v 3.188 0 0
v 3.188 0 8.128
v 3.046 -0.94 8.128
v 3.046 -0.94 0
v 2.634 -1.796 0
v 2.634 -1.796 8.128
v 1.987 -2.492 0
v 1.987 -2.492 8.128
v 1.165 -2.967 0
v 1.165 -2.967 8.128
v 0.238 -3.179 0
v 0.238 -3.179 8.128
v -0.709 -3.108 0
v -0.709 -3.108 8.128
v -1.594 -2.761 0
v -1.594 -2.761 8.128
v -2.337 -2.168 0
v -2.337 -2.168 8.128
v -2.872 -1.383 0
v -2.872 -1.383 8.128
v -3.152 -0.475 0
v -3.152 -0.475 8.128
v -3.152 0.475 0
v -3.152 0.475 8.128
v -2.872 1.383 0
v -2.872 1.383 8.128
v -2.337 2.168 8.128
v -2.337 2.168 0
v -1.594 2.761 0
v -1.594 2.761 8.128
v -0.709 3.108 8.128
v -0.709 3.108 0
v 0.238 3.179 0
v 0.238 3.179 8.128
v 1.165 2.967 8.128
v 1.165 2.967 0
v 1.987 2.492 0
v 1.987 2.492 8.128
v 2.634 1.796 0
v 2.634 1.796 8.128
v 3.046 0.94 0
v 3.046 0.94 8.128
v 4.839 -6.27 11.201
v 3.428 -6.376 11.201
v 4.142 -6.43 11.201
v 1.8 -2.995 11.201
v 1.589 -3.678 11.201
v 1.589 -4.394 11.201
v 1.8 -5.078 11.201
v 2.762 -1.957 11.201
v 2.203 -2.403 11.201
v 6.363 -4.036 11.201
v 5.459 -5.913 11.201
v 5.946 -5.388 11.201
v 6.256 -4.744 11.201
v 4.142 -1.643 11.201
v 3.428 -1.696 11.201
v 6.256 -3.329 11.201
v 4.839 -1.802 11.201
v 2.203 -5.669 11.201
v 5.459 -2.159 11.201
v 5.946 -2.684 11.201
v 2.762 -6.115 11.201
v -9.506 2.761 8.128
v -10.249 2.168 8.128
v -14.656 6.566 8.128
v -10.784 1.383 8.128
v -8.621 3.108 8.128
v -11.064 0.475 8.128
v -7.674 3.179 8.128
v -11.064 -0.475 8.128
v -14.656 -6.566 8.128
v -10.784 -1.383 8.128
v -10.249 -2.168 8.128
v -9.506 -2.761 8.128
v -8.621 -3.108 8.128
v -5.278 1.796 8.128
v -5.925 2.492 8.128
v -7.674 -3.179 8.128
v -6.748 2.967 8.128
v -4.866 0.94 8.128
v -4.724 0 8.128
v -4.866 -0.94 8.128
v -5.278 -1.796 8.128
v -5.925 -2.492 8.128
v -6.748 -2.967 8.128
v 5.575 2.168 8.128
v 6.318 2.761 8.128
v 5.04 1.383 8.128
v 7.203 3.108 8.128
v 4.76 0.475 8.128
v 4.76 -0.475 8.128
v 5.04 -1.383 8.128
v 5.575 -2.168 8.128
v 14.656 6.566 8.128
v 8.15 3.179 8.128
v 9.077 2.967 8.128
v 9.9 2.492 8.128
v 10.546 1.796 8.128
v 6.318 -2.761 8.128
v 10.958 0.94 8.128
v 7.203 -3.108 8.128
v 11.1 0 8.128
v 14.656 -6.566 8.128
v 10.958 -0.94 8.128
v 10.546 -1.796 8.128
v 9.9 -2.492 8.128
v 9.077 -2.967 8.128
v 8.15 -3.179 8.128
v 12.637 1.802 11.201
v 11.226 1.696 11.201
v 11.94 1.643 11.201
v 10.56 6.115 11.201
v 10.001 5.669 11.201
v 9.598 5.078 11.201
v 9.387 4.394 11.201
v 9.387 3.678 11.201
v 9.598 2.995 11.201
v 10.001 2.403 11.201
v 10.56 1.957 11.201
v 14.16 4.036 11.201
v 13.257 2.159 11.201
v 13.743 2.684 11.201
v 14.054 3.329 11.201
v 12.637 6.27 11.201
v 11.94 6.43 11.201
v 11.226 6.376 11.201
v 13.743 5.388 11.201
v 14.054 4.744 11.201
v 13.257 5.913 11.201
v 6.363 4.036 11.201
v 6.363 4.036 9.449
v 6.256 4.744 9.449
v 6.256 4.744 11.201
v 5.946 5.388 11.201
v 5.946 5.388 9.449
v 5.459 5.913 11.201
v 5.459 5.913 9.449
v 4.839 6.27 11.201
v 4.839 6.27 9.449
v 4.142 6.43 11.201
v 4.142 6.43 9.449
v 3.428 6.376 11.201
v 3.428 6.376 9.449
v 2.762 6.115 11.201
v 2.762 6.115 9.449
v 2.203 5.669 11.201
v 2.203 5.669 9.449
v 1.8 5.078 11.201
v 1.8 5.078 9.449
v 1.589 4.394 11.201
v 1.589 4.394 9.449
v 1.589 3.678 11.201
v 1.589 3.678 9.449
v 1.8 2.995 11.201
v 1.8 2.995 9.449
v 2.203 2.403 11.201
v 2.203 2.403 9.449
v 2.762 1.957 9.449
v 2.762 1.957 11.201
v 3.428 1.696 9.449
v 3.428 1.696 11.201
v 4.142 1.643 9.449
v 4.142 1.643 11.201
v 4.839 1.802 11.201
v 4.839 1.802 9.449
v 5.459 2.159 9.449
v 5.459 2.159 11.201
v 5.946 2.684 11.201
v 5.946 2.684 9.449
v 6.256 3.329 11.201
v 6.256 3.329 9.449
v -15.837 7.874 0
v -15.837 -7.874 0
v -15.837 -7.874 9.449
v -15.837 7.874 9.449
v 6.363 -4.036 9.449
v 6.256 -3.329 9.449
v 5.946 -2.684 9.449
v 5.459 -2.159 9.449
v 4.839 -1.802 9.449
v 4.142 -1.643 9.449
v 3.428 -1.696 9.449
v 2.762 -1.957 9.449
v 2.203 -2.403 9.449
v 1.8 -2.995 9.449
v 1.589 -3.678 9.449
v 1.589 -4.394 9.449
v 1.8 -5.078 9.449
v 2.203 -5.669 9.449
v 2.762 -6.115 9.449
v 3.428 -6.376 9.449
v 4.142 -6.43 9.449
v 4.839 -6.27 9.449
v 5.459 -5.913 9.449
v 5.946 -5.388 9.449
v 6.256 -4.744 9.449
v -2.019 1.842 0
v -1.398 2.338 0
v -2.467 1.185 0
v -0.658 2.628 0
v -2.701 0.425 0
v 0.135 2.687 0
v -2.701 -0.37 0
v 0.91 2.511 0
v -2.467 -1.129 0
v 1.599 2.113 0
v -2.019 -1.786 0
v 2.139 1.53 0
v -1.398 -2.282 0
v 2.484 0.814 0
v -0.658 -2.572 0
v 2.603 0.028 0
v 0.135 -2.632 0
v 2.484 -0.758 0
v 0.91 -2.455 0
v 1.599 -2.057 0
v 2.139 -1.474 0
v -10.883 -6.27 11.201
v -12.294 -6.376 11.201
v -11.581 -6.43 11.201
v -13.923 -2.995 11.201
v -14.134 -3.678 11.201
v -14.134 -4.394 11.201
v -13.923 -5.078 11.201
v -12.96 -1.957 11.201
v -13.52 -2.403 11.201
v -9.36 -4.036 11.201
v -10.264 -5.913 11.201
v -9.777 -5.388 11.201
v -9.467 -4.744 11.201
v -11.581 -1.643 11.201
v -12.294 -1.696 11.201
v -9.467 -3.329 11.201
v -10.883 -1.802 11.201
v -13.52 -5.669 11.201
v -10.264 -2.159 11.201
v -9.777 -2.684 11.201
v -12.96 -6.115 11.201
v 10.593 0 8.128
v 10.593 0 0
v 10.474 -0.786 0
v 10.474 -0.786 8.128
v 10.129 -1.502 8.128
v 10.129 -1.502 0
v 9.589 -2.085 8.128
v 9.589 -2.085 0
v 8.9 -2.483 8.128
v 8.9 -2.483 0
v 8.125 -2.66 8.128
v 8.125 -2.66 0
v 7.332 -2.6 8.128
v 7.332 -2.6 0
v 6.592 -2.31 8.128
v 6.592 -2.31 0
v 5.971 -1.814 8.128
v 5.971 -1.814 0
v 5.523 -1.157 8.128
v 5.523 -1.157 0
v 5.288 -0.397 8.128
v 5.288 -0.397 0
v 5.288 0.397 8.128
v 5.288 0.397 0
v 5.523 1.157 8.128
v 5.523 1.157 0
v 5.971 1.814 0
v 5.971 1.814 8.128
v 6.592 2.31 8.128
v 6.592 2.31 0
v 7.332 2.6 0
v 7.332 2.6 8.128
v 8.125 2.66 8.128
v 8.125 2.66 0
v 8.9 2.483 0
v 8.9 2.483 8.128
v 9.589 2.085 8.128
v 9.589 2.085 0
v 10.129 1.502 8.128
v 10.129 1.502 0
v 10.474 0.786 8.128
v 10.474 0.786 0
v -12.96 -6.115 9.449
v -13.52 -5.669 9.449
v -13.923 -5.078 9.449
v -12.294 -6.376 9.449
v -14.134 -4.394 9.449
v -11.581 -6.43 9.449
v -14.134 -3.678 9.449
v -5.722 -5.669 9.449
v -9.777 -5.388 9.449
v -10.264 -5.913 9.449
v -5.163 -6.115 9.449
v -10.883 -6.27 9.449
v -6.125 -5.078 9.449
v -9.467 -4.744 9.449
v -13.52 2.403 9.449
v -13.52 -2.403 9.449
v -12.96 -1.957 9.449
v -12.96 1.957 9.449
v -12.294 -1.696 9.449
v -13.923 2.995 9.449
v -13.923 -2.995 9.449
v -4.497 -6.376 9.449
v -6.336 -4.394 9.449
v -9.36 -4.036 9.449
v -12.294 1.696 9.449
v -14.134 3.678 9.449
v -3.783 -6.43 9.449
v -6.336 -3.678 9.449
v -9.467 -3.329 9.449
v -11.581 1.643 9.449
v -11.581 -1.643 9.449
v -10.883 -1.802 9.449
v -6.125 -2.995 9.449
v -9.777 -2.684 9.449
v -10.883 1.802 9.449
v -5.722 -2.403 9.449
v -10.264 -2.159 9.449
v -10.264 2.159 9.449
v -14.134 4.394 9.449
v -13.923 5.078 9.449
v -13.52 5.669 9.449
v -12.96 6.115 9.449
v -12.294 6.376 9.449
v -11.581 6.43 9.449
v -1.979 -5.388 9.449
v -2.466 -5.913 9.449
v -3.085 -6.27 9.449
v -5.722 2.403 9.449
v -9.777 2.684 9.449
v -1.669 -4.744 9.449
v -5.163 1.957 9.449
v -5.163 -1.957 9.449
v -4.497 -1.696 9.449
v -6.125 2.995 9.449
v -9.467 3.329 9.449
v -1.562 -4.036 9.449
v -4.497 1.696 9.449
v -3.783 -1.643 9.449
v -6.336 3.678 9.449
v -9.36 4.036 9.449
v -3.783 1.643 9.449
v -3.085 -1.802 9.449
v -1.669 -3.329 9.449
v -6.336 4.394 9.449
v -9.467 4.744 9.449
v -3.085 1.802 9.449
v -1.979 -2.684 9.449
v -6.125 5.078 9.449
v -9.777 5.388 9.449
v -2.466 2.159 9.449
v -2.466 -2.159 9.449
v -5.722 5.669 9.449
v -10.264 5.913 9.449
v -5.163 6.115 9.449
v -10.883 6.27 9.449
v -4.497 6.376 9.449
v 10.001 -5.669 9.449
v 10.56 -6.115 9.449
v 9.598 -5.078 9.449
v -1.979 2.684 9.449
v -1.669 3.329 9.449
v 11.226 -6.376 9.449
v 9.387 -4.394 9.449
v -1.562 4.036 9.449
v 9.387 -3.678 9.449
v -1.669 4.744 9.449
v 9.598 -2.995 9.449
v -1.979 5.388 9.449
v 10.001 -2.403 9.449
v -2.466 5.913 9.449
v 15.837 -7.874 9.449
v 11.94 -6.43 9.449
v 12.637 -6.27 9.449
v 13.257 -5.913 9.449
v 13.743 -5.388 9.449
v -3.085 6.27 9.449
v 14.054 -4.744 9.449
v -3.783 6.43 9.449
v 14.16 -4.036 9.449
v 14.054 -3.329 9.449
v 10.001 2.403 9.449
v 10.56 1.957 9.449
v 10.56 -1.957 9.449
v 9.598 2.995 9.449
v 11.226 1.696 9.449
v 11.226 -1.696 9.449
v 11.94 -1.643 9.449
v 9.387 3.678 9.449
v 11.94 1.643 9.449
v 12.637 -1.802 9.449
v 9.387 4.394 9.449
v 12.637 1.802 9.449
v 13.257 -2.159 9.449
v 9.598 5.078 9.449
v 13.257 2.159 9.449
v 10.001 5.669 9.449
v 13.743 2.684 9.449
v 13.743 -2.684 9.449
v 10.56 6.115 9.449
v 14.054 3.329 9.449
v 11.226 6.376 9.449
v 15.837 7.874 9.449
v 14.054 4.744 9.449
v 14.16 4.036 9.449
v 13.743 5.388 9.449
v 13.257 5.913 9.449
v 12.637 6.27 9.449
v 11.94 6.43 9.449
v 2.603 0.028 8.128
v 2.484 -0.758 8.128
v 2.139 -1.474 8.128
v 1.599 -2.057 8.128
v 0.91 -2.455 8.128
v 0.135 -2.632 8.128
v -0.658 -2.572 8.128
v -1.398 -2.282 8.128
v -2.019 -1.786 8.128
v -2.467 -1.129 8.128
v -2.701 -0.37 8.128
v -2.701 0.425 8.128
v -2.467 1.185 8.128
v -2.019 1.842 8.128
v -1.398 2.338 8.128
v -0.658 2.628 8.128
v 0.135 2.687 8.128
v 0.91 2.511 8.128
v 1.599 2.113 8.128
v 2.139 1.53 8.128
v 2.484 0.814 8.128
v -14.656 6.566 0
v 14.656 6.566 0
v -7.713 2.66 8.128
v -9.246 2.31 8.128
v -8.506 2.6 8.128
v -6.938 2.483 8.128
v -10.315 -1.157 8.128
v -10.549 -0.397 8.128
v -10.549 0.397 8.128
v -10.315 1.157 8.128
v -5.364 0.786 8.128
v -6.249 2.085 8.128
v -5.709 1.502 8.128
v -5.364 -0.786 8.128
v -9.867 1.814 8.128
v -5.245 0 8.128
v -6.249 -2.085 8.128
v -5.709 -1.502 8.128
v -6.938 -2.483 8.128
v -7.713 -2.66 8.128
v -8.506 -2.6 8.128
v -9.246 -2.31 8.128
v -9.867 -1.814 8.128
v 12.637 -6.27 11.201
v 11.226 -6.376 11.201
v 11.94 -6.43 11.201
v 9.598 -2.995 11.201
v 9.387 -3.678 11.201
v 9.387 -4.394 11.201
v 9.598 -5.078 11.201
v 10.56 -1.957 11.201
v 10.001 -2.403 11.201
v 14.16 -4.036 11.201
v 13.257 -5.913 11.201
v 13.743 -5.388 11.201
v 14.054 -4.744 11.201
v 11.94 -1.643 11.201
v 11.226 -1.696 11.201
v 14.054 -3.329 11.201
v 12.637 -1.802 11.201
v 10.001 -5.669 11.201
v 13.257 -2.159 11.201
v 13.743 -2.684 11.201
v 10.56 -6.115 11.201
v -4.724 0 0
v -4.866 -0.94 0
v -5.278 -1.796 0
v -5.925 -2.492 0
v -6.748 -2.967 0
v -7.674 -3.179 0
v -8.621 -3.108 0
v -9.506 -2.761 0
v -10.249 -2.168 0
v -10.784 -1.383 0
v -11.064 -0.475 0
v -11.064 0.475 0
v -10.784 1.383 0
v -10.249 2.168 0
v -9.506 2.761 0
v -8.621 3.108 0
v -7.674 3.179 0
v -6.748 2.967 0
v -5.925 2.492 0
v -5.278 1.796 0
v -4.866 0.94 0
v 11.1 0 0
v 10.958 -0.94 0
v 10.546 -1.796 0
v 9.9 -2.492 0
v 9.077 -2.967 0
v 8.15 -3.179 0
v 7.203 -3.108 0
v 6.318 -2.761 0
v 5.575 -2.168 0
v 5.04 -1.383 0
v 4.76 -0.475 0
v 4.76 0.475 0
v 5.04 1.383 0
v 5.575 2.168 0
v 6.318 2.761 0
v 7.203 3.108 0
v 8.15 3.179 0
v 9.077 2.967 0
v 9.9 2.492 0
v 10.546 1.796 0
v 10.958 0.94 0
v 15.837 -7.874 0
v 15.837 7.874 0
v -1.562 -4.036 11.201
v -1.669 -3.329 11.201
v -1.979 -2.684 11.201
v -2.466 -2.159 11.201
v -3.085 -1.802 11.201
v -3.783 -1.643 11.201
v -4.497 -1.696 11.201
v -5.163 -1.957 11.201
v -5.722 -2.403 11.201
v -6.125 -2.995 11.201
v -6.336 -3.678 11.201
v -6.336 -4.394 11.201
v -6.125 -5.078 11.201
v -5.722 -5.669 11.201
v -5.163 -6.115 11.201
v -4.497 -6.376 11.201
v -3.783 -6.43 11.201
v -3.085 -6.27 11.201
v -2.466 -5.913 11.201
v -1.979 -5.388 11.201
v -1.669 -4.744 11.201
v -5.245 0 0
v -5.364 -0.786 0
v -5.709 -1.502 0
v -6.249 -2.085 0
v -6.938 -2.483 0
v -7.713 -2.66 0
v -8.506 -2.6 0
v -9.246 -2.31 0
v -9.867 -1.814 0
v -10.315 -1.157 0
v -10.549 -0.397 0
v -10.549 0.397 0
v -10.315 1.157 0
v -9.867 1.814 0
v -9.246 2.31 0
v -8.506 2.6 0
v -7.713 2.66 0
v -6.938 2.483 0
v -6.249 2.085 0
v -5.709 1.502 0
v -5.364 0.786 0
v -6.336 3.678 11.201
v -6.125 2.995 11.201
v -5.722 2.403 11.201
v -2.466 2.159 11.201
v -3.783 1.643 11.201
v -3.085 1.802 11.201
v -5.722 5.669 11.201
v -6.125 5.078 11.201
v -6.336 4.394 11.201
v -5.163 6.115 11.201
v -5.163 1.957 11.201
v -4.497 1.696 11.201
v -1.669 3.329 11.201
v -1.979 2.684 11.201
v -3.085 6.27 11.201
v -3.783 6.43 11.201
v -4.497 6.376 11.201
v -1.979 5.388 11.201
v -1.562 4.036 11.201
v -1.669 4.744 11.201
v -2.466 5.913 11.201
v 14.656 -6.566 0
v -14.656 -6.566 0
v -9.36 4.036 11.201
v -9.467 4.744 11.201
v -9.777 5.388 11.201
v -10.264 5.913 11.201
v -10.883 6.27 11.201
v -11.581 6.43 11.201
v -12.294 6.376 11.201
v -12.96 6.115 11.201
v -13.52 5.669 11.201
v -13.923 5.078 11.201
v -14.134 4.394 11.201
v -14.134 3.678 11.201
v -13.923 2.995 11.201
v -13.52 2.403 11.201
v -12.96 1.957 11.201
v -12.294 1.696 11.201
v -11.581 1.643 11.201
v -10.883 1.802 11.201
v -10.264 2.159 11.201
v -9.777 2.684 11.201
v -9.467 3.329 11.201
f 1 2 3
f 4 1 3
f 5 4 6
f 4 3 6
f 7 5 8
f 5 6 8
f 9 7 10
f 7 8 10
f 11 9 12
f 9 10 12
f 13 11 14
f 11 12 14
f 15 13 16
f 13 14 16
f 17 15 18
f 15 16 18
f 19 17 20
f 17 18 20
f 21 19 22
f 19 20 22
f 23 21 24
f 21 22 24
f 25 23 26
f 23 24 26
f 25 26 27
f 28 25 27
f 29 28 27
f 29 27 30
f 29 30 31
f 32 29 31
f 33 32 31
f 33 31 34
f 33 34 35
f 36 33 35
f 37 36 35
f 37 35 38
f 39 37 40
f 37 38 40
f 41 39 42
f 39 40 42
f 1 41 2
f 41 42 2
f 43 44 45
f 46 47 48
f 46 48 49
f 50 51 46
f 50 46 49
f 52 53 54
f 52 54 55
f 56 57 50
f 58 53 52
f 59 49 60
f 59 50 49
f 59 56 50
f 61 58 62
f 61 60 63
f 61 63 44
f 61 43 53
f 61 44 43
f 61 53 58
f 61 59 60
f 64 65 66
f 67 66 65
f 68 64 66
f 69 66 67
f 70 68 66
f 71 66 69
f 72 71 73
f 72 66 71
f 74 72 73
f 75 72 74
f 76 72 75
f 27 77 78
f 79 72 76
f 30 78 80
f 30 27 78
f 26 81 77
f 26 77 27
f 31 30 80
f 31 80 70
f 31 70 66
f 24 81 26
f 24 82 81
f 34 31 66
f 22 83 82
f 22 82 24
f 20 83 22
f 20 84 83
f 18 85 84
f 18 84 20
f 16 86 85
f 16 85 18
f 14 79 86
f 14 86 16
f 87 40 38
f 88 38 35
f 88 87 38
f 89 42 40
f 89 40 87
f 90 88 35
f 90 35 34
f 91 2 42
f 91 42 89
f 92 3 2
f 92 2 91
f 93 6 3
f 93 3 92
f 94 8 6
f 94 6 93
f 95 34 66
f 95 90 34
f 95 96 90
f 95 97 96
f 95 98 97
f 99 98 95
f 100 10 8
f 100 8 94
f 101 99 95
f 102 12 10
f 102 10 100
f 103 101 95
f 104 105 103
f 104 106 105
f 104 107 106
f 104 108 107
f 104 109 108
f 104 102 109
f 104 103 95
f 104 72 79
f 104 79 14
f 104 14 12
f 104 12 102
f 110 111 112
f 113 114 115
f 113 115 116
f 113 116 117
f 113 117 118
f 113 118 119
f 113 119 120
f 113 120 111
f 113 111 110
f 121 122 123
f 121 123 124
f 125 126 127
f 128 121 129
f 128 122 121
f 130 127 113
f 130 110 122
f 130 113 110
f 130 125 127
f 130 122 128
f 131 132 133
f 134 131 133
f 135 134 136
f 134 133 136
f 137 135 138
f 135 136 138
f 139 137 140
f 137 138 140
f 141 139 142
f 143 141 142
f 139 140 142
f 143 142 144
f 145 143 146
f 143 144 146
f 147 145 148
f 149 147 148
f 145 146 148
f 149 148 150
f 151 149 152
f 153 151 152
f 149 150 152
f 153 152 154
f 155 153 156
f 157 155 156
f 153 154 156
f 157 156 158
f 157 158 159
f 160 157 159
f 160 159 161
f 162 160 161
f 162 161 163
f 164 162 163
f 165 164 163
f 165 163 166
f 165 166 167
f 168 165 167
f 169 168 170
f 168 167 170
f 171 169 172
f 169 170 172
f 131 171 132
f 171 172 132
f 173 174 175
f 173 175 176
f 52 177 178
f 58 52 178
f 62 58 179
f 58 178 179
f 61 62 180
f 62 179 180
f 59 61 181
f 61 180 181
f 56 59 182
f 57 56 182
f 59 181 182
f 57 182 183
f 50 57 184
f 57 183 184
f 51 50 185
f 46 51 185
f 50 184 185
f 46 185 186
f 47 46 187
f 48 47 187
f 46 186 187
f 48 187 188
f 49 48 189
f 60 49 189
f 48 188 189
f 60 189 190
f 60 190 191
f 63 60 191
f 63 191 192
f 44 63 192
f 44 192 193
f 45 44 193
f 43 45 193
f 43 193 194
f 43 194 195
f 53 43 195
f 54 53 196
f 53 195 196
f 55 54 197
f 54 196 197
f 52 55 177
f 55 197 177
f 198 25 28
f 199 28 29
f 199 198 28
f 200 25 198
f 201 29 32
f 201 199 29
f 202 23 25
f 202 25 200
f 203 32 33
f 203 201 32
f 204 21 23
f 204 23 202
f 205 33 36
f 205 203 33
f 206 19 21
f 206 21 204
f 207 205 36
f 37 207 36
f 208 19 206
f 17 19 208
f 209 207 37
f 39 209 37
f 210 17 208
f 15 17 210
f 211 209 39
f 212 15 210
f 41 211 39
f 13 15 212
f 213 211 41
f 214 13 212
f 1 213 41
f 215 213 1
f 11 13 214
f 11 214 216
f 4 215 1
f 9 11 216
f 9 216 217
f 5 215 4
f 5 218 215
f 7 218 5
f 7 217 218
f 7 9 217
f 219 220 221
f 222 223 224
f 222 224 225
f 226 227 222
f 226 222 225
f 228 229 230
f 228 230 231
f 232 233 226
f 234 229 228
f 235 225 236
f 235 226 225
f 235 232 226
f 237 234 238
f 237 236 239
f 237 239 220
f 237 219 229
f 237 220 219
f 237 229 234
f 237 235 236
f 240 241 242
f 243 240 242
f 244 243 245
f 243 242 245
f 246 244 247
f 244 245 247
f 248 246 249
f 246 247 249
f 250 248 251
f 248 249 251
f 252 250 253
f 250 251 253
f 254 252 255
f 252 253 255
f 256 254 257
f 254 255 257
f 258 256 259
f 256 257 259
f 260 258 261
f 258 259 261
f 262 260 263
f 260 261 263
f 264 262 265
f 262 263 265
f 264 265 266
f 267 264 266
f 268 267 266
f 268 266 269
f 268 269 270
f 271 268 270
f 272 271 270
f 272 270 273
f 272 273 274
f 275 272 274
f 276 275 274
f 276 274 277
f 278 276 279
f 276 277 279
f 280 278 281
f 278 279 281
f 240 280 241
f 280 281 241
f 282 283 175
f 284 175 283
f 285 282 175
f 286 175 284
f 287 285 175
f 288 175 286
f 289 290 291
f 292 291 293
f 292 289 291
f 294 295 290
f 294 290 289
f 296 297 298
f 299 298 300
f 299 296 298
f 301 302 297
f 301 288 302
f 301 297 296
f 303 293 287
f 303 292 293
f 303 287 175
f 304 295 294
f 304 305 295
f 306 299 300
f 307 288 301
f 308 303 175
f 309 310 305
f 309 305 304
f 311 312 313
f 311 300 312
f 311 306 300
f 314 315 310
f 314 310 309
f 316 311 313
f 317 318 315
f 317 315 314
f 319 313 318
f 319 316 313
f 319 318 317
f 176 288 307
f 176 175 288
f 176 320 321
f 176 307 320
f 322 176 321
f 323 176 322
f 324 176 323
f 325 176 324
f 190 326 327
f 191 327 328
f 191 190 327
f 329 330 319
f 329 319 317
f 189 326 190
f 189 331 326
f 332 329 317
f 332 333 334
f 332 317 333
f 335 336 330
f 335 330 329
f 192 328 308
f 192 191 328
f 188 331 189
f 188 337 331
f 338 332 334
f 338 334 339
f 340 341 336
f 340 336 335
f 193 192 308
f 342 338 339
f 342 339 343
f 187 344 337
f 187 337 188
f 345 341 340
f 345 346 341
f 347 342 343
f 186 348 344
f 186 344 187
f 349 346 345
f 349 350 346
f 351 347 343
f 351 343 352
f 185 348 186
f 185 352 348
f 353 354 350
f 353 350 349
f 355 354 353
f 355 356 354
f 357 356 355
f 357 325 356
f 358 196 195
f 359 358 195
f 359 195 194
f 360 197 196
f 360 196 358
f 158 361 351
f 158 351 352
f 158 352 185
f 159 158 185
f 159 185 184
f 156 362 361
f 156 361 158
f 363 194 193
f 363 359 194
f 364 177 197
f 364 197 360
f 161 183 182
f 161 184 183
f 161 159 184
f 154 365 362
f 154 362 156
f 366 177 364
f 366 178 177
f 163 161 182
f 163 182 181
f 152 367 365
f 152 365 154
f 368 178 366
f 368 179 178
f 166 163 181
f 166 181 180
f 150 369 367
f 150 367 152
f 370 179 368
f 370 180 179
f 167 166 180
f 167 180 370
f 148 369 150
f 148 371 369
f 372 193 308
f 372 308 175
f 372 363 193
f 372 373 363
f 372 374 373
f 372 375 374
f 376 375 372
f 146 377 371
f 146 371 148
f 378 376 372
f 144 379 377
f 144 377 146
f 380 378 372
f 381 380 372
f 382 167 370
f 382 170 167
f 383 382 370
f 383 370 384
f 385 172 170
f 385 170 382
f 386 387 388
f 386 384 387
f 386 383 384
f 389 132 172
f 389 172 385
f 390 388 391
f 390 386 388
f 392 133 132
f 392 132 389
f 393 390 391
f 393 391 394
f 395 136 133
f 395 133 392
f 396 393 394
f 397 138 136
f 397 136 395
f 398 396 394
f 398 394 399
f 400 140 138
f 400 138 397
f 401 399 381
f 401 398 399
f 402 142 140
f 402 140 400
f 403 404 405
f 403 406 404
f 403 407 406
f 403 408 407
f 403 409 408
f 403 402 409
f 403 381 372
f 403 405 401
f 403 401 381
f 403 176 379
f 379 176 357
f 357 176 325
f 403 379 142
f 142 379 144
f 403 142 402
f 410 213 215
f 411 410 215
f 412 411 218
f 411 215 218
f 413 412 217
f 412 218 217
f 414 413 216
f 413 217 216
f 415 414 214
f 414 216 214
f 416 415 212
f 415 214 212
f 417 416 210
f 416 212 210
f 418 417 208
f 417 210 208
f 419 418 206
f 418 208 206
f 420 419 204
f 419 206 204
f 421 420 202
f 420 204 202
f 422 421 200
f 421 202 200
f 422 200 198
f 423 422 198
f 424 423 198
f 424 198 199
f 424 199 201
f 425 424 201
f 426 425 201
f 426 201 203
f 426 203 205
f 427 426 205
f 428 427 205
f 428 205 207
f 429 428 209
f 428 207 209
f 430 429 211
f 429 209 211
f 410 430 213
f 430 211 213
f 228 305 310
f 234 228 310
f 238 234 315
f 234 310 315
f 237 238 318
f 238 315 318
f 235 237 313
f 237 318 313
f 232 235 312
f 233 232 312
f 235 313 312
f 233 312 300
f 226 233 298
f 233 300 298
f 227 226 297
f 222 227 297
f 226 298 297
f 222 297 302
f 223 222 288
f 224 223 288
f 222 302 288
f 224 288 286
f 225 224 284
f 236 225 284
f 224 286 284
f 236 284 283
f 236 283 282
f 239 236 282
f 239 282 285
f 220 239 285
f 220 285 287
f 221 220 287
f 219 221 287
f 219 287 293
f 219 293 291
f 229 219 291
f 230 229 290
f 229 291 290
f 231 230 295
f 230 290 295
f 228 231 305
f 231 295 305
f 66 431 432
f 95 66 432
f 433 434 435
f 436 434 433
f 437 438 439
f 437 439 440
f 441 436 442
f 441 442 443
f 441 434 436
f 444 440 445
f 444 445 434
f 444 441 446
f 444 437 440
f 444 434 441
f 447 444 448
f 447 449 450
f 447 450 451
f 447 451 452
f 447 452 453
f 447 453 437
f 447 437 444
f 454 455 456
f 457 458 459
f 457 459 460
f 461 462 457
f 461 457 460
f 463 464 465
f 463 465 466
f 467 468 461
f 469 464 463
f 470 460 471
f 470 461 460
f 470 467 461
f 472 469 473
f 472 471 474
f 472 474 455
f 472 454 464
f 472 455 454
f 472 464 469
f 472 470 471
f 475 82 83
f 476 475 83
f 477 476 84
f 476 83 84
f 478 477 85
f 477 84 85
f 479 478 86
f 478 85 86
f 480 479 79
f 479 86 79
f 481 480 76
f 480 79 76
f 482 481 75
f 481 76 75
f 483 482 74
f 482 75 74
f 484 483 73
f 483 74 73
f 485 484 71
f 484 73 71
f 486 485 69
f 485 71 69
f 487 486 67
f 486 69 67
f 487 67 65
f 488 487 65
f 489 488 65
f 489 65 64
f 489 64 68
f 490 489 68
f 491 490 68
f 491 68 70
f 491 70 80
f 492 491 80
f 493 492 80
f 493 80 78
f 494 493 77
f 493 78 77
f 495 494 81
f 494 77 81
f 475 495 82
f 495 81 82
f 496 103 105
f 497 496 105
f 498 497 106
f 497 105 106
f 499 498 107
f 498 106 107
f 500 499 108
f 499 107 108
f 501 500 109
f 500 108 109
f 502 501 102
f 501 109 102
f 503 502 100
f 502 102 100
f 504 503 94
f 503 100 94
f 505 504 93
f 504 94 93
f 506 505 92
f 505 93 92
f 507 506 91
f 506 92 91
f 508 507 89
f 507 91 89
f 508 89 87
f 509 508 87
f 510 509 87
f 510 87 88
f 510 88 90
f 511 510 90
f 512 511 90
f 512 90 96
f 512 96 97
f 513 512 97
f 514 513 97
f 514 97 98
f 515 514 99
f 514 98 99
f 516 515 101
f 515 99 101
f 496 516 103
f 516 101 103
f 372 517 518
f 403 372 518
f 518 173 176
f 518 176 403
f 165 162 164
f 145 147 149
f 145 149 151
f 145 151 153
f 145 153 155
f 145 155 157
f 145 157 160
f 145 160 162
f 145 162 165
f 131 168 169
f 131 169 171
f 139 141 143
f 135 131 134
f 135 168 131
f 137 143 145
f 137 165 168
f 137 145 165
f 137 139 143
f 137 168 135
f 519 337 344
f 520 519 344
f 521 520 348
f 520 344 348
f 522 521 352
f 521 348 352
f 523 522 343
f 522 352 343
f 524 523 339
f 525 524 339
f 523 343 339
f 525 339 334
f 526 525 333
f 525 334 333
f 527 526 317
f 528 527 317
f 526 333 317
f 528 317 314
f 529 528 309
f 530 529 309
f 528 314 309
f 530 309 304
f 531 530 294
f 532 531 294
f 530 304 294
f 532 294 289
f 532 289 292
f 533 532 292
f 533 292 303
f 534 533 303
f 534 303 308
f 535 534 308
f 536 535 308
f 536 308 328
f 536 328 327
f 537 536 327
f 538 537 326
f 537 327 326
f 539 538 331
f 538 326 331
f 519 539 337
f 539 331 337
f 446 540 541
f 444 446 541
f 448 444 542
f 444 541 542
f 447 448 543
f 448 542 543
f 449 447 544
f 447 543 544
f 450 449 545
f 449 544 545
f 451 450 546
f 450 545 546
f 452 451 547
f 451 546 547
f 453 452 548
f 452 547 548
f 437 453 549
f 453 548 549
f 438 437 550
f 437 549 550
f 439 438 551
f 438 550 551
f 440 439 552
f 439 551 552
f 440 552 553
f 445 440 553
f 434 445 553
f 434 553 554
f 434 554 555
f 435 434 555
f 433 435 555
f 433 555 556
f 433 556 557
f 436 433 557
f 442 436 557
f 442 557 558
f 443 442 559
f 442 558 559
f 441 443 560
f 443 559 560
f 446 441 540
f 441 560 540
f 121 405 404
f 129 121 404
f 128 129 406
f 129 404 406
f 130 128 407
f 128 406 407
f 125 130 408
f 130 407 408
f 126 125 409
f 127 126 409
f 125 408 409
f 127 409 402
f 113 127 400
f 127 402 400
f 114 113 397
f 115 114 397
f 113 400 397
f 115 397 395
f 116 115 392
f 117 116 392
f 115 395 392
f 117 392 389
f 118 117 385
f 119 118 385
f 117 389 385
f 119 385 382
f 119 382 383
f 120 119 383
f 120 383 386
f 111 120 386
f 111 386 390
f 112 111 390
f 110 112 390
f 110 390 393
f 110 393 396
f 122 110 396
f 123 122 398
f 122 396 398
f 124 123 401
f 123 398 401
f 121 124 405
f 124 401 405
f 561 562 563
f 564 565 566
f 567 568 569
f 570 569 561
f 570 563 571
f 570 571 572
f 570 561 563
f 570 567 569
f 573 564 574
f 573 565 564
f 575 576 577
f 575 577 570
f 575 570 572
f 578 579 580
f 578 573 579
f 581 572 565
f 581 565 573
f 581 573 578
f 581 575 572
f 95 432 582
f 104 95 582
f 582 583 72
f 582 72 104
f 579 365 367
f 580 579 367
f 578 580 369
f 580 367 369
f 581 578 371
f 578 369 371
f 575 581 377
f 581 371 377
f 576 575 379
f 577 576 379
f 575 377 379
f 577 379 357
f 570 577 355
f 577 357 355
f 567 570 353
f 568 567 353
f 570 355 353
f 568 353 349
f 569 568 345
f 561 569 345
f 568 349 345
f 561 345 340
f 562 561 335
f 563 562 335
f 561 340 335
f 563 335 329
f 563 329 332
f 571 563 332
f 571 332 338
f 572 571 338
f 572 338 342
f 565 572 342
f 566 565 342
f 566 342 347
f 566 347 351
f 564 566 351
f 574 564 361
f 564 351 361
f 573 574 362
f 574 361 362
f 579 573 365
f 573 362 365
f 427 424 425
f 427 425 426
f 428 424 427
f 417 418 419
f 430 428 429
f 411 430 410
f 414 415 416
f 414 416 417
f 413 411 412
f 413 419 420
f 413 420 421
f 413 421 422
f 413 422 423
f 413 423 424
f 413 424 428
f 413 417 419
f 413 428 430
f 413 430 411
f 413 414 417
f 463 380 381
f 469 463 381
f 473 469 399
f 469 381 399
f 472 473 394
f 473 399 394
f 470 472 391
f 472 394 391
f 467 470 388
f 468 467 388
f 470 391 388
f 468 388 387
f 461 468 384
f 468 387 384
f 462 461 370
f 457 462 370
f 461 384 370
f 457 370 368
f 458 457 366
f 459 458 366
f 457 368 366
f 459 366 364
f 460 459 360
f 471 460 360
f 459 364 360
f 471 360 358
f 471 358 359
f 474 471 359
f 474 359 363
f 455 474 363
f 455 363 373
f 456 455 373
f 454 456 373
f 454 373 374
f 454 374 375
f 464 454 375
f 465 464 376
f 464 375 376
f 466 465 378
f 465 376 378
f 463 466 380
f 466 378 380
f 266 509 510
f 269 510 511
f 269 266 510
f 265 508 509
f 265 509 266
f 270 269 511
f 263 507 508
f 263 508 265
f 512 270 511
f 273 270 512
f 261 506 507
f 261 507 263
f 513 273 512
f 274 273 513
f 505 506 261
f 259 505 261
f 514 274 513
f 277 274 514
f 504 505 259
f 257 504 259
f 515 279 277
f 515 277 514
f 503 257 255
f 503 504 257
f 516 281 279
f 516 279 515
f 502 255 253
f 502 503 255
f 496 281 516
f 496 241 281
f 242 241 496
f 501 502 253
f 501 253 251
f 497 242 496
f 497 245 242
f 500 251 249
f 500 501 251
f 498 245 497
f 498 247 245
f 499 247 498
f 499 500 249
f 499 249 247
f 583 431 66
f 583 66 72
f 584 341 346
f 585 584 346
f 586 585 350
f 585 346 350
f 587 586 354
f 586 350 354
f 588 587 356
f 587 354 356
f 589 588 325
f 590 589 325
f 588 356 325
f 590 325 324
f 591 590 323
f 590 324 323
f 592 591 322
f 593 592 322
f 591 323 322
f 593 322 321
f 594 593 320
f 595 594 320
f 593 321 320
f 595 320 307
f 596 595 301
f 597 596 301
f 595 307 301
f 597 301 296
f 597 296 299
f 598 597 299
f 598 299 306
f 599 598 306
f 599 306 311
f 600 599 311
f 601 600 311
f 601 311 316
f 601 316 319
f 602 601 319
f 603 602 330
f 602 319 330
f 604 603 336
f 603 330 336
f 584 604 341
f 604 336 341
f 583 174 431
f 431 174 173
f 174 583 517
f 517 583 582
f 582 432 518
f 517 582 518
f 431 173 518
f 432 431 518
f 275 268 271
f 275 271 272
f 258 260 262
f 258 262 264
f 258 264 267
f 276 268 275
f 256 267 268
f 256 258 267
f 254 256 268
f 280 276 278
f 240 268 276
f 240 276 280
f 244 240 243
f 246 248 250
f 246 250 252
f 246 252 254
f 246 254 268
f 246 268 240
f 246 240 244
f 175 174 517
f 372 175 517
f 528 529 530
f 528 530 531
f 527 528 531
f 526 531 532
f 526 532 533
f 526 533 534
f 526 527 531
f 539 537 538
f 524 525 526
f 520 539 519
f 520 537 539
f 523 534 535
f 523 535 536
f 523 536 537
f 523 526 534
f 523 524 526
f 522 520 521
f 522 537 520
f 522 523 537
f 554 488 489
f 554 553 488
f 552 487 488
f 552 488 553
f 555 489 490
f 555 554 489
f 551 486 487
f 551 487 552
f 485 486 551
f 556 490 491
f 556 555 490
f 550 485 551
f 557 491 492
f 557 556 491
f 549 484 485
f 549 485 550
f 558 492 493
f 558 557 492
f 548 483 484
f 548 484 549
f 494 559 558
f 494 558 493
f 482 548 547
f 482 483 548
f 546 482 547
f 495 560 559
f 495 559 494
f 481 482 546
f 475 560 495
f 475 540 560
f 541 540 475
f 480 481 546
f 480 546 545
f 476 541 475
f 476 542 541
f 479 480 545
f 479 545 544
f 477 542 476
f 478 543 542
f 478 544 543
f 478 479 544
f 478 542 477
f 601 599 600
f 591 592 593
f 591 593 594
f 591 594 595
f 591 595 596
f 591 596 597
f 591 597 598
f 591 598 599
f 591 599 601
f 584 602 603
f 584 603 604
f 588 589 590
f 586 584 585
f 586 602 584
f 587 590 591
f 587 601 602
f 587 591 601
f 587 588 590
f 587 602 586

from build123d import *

# Parameters (mm, degrees)
F0_W     = 31.6738
F0_H     = 15.748
F1_DEPTH = 9.4488
F2_R     = 2.4003
F3_DEPTH = 1.7526
F4_W     = 29.3116
F4_H     = 13.1318
F5_DEPTH = 8.128
F6_R     = 3.1877
F7_DEPTH = 8.128
F8_R     = 2.667
F9_DEPTH = 8.128


with BuildPart() as f1:
    # F0 (on Top) → F1 (new body)
    with BuildSketch(Plane.XY):
        Rectangle(F0_W, F0_H)
    extrude(amount=F1_DEPTH)

    # F2 (on face) → F3 (join)
    with BuildSketch(Plane.XY.offset(9.4488)):
        with Locations((-11.7602, 4.036113)):
            Circle(F2_R)
        with Locations((3.9624, -4.036113)):
            Circle(F2_R)
        with Locations((3.9624, 4.036113)):
            Circle(F2_R)
        with Locations((-3.9624, 4.036113)):
            Circle(F2_R)
        with Locations((-3.9624, -4.036113)):
            Circle(F2_R)
        with Locations((-11.7602, -4.036113)):
            Circle(F2_R)
        with Locations((11.7602, -4.036113)):
            Circle(F2_R)
        with Locations((11.7602, 4.036113)):
            Circle(F2_R)
    extrude(amount=F3_DEPTH)

    # F4 (on face) → F5 (cut)
    with BuildSketch(Plane(origin=(0, 0, 0), x_dir=(1, 0, 0), z_dir=(0, 0, -1))):
        Rectangle(F4_W, F4_H)
    extrude(amount=-F5_DEPTH, mode=Mode.SUBTRACT)

    # F6 (on face) → F7 (join)
    with BuildSketch(Plane(origin=(0, 0, 8.128), x_dir=(1, 0, 0), z_dir=(0, 0, -1))):
        with Locations((-7.9121, 0)):
            Circle(F6_R)
        with Locations((7.9121, 0)):
            Circle(F6_R)
        Circle(F6_R)
    extrude(amount=F7_DEPTH)

    # F8 (on face) → F9 (cut)
    with BuildSketch(Plane(origin=(0, 0, 0), x_dir=(1, 0, 0), z_dir=(0, 0, -1))):
        with Locations((-7.9121, 0)):
            Circle(F8_R)
        with Locations((-0.064154, -0.027935)):
            Circle(F8_R)
        with Locations((7.9257, 0)):
            Circle(F8_R)
    extrude(amount=-F9_DEPTH, mode=Mode.SUBTRACT)


solid = f1.part
